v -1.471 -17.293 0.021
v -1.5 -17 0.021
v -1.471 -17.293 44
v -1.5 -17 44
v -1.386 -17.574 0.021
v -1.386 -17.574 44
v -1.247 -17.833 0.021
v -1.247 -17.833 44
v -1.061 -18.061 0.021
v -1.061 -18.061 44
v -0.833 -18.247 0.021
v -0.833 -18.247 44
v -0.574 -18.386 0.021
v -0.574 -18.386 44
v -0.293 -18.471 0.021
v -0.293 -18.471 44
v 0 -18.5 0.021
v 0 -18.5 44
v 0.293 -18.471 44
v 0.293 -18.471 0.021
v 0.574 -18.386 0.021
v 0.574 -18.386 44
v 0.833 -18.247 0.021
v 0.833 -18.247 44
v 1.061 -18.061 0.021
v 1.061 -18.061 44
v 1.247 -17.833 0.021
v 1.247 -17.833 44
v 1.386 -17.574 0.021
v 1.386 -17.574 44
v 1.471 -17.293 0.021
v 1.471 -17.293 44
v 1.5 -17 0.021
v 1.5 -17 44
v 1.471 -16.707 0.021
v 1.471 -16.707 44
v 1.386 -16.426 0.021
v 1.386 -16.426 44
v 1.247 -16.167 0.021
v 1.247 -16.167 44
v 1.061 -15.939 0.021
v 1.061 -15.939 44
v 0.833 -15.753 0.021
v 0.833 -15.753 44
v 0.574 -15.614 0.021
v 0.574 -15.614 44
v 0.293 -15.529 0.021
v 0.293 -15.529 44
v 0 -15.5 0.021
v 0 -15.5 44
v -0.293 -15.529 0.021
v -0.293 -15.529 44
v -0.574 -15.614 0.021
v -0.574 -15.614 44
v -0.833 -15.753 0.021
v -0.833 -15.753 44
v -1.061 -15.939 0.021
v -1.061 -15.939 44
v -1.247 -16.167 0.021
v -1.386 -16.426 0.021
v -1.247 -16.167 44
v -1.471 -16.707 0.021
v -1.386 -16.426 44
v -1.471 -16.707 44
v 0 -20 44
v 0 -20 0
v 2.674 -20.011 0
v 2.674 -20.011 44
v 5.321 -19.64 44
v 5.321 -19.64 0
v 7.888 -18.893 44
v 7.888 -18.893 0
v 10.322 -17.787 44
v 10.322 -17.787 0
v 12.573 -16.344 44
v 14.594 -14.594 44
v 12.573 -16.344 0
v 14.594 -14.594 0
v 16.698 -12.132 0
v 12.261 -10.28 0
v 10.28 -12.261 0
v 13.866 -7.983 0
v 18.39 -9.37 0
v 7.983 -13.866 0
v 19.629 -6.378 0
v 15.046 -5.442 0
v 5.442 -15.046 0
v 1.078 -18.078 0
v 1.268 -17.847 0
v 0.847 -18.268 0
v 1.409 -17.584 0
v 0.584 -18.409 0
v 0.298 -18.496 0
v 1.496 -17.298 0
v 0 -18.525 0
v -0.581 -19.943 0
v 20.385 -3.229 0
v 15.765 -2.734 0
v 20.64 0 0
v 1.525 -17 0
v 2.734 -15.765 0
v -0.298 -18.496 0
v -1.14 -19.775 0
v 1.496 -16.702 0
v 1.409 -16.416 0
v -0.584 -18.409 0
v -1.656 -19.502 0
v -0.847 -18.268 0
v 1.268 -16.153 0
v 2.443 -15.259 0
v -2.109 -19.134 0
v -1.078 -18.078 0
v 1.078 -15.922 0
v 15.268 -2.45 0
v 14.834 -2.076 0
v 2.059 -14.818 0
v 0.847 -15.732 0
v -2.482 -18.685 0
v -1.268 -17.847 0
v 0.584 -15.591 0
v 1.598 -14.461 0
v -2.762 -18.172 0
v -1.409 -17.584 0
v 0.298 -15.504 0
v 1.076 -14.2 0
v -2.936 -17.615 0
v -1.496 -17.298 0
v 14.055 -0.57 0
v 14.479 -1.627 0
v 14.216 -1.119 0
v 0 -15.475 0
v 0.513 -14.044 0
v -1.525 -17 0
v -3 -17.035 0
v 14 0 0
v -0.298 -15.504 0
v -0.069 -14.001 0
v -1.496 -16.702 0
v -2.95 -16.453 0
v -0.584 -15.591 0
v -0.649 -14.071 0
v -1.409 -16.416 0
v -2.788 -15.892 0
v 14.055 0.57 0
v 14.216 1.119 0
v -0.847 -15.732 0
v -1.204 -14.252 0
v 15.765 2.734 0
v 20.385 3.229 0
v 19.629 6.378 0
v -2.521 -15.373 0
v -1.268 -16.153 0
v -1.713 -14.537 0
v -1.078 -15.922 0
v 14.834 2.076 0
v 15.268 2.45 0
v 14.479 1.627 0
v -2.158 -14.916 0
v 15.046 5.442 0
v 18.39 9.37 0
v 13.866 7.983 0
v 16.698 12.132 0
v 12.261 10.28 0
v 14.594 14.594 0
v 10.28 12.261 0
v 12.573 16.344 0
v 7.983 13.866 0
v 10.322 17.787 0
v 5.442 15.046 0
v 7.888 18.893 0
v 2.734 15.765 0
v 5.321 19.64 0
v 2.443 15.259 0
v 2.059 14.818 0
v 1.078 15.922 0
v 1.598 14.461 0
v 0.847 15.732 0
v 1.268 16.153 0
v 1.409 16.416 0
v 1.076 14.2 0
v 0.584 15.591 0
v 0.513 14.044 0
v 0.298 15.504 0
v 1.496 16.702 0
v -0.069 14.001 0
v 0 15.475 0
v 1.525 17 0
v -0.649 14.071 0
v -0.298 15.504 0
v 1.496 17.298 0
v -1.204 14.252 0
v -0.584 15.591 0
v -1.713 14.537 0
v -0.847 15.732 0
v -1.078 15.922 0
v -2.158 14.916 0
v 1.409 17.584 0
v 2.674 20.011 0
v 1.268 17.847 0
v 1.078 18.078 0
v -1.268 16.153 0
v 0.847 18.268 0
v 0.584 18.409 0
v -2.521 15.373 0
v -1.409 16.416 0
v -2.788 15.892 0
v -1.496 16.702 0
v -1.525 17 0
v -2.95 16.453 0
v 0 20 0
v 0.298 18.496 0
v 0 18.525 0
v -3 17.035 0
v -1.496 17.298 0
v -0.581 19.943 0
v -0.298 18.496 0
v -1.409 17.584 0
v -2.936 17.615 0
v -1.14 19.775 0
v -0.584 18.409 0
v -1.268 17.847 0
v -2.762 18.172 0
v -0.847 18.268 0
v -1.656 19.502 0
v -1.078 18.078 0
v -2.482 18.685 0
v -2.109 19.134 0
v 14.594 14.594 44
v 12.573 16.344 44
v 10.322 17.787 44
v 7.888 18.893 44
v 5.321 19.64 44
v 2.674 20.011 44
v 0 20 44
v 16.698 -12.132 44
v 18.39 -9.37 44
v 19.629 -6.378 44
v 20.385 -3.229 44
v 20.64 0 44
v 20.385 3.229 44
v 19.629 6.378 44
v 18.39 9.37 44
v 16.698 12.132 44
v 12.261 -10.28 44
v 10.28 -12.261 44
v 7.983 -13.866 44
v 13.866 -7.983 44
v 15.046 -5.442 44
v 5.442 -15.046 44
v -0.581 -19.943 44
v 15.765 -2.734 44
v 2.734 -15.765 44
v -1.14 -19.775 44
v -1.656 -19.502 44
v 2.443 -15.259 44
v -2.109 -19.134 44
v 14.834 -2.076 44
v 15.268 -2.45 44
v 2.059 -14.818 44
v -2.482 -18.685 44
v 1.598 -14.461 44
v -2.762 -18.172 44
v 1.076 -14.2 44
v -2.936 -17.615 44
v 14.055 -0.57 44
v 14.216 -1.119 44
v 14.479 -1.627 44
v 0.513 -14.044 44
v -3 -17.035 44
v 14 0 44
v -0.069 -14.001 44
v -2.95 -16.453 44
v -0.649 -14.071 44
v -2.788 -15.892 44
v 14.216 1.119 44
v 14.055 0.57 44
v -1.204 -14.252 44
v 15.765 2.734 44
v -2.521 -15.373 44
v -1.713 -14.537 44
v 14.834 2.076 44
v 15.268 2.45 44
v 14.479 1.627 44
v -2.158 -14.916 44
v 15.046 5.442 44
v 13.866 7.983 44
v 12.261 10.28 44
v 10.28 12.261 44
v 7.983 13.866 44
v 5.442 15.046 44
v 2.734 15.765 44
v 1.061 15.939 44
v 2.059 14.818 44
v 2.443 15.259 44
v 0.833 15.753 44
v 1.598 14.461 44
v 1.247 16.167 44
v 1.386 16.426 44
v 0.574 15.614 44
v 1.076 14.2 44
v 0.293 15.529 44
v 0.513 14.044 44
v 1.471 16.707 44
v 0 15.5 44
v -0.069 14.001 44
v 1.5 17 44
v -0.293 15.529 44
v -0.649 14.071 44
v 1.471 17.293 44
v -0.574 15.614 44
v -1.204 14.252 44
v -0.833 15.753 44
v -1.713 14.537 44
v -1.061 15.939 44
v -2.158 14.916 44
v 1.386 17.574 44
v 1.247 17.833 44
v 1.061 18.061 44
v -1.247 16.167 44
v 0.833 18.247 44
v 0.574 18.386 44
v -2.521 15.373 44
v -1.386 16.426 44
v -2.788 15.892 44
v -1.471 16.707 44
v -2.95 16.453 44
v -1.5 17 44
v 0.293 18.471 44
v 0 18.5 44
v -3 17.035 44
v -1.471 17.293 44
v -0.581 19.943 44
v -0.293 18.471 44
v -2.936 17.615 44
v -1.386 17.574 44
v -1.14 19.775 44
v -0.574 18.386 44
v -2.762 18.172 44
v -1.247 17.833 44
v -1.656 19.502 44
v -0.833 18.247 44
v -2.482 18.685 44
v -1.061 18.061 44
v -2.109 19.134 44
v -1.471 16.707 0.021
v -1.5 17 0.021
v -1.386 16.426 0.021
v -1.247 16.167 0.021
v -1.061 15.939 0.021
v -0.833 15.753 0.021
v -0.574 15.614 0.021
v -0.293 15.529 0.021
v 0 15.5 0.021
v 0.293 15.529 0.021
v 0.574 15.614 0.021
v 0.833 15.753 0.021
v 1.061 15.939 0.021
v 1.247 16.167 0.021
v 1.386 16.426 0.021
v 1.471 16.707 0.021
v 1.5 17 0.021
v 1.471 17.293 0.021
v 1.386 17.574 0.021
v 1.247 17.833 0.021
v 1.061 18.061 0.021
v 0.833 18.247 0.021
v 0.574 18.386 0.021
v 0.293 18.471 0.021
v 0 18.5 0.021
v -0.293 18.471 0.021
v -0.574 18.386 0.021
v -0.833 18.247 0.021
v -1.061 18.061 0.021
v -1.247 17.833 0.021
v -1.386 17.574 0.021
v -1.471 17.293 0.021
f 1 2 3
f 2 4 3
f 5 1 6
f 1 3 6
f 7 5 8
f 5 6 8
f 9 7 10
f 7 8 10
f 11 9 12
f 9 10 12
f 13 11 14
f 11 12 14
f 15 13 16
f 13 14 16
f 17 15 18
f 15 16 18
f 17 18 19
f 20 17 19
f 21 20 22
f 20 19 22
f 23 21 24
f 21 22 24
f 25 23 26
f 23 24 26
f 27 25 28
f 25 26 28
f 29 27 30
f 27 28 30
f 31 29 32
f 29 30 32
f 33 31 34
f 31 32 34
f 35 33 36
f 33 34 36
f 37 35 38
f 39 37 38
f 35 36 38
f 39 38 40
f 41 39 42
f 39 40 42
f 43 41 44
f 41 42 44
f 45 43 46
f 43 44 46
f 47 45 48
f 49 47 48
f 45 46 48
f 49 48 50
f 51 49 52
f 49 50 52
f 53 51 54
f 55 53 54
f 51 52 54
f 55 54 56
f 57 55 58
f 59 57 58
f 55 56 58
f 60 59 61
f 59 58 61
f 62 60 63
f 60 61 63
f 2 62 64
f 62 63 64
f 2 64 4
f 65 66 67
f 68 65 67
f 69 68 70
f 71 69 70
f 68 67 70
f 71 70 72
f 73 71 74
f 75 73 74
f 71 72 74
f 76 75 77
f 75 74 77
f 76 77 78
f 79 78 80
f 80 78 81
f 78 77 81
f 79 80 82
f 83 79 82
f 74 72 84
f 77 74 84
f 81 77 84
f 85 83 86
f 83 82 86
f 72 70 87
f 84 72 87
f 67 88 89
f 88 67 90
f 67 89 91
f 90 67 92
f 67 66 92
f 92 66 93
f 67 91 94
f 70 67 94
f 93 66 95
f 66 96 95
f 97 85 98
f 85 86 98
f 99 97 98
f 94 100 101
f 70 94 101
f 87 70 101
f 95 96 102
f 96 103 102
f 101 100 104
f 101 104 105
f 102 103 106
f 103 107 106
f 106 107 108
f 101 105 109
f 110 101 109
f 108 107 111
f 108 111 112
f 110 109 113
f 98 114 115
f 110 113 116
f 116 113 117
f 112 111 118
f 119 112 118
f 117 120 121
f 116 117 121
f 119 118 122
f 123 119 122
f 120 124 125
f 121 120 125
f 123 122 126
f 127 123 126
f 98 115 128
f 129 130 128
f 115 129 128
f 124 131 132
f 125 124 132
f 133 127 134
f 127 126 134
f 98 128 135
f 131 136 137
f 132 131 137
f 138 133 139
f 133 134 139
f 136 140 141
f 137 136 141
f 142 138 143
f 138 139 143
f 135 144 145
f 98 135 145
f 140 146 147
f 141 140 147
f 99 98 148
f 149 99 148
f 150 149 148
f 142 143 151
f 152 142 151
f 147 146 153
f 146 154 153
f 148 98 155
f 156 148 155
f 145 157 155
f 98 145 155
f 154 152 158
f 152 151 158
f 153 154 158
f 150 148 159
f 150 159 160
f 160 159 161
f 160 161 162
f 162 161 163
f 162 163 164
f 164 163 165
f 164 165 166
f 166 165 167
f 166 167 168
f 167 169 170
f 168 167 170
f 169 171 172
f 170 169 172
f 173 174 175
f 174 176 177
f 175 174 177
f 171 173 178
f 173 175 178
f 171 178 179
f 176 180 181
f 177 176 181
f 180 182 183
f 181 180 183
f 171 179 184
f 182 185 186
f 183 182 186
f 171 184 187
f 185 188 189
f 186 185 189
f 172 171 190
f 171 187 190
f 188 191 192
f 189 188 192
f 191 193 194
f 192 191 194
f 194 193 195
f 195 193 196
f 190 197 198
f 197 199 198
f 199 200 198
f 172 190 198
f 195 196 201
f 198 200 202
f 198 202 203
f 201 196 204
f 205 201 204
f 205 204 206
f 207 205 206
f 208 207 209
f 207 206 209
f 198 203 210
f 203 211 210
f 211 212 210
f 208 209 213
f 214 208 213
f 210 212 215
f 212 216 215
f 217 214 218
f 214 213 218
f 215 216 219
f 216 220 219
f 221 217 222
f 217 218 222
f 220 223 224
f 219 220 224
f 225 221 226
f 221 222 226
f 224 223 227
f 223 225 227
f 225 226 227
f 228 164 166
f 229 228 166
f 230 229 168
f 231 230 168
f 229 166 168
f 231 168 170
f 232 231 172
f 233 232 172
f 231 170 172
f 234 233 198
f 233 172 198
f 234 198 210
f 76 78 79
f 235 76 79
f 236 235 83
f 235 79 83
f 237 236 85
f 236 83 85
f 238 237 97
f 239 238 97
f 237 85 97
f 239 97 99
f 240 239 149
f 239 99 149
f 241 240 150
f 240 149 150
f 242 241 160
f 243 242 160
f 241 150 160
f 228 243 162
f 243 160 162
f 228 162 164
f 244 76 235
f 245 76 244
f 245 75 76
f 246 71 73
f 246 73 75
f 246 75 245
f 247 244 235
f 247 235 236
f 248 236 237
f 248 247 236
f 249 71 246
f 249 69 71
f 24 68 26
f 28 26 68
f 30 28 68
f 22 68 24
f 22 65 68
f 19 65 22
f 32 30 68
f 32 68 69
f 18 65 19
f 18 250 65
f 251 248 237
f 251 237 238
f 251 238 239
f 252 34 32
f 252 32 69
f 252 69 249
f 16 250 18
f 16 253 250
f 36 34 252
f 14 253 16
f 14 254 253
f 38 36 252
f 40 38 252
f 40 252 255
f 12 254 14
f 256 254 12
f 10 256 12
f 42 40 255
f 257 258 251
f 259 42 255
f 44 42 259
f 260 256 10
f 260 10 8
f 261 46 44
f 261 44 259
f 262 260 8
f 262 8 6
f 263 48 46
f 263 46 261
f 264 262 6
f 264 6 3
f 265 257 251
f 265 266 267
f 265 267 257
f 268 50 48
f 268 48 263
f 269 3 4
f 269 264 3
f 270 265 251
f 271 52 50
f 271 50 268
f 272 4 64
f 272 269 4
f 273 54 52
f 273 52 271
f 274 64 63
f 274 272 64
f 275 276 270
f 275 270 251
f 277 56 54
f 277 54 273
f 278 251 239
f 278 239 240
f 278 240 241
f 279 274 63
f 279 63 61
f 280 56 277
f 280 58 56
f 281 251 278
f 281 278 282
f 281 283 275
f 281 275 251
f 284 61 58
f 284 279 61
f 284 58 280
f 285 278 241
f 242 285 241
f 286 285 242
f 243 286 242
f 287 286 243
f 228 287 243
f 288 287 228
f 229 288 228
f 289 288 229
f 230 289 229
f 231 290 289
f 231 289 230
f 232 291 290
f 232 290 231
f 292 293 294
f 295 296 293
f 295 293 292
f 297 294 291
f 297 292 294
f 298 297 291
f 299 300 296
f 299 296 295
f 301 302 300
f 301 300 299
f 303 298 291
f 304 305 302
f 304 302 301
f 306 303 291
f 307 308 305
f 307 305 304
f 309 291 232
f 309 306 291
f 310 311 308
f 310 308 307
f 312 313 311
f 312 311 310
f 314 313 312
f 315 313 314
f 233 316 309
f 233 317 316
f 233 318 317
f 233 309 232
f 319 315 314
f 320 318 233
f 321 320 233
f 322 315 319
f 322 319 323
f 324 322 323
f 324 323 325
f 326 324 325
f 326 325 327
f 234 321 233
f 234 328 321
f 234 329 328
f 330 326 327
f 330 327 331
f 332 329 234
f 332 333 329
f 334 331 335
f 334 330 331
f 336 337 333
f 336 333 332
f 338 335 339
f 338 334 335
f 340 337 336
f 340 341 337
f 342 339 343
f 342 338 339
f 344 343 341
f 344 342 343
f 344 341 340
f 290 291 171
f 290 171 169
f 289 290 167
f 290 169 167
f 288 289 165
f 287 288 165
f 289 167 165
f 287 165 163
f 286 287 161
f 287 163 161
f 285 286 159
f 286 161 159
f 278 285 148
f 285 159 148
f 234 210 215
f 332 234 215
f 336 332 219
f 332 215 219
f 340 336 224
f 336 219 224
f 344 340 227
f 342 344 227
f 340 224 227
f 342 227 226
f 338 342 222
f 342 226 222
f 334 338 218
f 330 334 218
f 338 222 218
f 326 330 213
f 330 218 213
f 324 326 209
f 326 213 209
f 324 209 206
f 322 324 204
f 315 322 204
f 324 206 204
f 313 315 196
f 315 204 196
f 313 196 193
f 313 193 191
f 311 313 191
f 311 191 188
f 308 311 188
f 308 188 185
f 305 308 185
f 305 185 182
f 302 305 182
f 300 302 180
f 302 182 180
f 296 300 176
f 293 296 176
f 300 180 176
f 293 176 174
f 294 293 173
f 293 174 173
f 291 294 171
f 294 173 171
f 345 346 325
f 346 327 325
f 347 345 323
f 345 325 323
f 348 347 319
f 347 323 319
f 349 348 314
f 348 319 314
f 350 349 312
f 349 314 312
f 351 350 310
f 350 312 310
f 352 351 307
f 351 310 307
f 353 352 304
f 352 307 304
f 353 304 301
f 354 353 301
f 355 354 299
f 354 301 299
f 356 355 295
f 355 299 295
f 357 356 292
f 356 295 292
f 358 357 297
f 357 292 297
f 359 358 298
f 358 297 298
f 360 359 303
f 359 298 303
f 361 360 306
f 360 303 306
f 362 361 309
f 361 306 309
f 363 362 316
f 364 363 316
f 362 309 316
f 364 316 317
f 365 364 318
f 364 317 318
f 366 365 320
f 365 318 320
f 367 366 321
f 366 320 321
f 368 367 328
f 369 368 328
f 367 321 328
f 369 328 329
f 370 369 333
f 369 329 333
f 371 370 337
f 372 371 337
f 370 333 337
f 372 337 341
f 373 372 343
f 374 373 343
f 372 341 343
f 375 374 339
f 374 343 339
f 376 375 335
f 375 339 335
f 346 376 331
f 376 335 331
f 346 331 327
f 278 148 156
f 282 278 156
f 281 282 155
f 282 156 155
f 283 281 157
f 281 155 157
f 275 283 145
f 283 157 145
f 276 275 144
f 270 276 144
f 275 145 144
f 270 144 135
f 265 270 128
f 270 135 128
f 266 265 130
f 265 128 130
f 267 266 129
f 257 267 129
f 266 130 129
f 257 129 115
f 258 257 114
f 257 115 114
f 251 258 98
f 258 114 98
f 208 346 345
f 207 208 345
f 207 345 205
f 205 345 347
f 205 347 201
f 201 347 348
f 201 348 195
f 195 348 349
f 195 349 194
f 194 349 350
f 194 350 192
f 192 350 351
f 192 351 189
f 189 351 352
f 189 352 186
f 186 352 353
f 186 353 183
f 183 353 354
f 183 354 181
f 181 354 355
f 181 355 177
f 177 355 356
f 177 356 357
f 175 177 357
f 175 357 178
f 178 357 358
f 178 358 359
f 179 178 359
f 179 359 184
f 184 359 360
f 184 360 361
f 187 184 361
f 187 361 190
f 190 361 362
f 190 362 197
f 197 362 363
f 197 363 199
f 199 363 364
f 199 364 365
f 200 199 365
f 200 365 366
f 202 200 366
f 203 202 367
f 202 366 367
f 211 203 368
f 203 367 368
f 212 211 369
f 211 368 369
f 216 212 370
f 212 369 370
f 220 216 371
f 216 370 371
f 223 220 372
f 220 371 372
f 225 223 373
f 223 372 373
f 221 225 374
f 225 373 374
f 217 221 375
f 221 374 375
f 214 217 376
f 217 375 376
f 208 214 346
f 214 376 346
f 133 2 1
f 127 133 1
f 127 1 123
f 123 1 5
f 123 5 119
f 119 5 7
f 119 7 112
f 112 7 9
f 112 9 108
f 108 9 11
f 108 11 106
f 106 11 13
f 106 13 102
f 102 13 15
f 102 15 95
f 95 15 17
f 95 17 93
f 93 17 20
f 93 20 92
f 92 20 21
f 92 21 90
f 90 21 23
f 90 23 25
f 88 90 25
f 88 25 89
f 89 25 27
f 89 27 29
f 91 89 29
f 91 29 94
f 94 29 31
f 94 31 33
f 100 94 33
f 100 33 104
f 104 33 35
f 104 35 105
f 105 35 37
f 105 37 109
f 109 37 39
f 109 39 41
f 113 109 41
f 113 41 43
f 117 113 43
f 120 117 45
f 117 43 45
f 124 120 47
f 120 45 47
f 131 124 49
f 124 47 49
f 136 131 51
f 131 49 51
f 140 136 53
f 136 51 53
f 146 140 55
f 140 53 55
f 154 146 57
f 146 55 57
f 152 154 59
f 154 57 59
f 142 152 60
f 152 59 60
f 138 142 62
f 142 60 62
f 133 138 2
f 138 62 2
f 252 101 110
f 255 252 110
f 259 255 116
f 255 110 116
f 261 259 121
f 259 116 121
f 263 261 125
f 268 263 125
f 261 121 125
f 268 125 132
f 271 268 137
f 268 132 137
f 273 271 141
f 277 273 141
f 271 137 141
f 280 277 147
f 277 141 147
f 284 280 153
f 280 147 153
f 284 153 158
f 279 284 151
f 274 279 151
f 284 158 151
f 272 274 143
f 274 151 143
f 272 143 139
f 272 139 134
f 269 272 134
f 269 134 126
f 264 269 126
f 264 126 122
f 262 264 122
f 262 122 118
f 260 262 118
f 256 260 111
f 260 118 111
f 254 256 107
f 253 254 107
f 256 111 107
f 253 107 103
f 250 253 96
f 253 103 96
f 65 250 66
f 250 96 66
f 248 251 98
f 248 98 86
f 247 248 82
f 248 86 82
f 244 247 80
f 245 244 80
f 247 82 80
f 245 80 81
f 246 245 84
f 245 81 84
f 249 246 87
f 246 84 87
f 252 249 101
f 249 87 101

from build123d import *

# Parameters (mm, degrees)
BOSS_EXTRUDE1_DEPTH             = 44
F_3_0MM_DOWEL_HOLE1_D           = 3
F_3_0MM_DOWEL_HOLE1_CSINK_D     = 3.05
F_3_0MM_DOWEL_HOLE1_CSINK_ANGLE = 100


with BuildPart() as part:
    # Sketch1 → Boss-Extrude1 (new body)
    with BuildSketch(Plane(origin=(0, 0, 0), x_dir=(0, 1, 0), z_dir=(0, 0, 1))):
        with BuildLine():
            ThreePointArc((14.594339842, -14.594339842), (18.893257917, -7.888351803), (20, 0))
            ThreePointArc((20, 0), (15.373021566, 2.520504151), (15.764705882, -2.733870597))
            ThreePointArc((15.764705882, -2.733870597), (11.313708499, -11.313708499), (2.733870597, -15.764705882))
            ThreePointArc((2.733870597, -15.764705882), (0, -14), (-2.733870597, -15.764705882))
            ThreePointArc((-2.733870597, -15.764705882), (-11.313708499, -11.313708499), (-15.764705882, -2.733870597))
            ThreePointArc((-15.764705882, -2.733870597), (-15.373021566, 2.520504151), (-20, 0))
            ThreePointArc((-20, 0), (-18.893257917, -7.888351803), (-14.594339842, -14.594339842))
            ThreePointArc((-14.594339842, -14.594339842), (0, -20.639513339), (14.594339842, -14.594339842))
        make_face()
    extrude(amount=BOSS_EXTRUDE1_DEPTH)

    # Ø3.0mm Dowel Hole1 (through all)
    with Locations(Plane(origin=(0, 0, 0), x_dir=(1, 0, 0), z_dir=(0, 0, -1))):
        with Locations((0, -17), (0, 17)):
            CounterSinkHole(F_3_0MM_DOWEL_HOLE1_D / 2, F_3_0MM_DOWEL_HOLE1_CSINK_D / 2, counter_sink_angle=F_3_0MM_DOWEL_HOLE1_CSINK_ANGLE)


solid = part.part
